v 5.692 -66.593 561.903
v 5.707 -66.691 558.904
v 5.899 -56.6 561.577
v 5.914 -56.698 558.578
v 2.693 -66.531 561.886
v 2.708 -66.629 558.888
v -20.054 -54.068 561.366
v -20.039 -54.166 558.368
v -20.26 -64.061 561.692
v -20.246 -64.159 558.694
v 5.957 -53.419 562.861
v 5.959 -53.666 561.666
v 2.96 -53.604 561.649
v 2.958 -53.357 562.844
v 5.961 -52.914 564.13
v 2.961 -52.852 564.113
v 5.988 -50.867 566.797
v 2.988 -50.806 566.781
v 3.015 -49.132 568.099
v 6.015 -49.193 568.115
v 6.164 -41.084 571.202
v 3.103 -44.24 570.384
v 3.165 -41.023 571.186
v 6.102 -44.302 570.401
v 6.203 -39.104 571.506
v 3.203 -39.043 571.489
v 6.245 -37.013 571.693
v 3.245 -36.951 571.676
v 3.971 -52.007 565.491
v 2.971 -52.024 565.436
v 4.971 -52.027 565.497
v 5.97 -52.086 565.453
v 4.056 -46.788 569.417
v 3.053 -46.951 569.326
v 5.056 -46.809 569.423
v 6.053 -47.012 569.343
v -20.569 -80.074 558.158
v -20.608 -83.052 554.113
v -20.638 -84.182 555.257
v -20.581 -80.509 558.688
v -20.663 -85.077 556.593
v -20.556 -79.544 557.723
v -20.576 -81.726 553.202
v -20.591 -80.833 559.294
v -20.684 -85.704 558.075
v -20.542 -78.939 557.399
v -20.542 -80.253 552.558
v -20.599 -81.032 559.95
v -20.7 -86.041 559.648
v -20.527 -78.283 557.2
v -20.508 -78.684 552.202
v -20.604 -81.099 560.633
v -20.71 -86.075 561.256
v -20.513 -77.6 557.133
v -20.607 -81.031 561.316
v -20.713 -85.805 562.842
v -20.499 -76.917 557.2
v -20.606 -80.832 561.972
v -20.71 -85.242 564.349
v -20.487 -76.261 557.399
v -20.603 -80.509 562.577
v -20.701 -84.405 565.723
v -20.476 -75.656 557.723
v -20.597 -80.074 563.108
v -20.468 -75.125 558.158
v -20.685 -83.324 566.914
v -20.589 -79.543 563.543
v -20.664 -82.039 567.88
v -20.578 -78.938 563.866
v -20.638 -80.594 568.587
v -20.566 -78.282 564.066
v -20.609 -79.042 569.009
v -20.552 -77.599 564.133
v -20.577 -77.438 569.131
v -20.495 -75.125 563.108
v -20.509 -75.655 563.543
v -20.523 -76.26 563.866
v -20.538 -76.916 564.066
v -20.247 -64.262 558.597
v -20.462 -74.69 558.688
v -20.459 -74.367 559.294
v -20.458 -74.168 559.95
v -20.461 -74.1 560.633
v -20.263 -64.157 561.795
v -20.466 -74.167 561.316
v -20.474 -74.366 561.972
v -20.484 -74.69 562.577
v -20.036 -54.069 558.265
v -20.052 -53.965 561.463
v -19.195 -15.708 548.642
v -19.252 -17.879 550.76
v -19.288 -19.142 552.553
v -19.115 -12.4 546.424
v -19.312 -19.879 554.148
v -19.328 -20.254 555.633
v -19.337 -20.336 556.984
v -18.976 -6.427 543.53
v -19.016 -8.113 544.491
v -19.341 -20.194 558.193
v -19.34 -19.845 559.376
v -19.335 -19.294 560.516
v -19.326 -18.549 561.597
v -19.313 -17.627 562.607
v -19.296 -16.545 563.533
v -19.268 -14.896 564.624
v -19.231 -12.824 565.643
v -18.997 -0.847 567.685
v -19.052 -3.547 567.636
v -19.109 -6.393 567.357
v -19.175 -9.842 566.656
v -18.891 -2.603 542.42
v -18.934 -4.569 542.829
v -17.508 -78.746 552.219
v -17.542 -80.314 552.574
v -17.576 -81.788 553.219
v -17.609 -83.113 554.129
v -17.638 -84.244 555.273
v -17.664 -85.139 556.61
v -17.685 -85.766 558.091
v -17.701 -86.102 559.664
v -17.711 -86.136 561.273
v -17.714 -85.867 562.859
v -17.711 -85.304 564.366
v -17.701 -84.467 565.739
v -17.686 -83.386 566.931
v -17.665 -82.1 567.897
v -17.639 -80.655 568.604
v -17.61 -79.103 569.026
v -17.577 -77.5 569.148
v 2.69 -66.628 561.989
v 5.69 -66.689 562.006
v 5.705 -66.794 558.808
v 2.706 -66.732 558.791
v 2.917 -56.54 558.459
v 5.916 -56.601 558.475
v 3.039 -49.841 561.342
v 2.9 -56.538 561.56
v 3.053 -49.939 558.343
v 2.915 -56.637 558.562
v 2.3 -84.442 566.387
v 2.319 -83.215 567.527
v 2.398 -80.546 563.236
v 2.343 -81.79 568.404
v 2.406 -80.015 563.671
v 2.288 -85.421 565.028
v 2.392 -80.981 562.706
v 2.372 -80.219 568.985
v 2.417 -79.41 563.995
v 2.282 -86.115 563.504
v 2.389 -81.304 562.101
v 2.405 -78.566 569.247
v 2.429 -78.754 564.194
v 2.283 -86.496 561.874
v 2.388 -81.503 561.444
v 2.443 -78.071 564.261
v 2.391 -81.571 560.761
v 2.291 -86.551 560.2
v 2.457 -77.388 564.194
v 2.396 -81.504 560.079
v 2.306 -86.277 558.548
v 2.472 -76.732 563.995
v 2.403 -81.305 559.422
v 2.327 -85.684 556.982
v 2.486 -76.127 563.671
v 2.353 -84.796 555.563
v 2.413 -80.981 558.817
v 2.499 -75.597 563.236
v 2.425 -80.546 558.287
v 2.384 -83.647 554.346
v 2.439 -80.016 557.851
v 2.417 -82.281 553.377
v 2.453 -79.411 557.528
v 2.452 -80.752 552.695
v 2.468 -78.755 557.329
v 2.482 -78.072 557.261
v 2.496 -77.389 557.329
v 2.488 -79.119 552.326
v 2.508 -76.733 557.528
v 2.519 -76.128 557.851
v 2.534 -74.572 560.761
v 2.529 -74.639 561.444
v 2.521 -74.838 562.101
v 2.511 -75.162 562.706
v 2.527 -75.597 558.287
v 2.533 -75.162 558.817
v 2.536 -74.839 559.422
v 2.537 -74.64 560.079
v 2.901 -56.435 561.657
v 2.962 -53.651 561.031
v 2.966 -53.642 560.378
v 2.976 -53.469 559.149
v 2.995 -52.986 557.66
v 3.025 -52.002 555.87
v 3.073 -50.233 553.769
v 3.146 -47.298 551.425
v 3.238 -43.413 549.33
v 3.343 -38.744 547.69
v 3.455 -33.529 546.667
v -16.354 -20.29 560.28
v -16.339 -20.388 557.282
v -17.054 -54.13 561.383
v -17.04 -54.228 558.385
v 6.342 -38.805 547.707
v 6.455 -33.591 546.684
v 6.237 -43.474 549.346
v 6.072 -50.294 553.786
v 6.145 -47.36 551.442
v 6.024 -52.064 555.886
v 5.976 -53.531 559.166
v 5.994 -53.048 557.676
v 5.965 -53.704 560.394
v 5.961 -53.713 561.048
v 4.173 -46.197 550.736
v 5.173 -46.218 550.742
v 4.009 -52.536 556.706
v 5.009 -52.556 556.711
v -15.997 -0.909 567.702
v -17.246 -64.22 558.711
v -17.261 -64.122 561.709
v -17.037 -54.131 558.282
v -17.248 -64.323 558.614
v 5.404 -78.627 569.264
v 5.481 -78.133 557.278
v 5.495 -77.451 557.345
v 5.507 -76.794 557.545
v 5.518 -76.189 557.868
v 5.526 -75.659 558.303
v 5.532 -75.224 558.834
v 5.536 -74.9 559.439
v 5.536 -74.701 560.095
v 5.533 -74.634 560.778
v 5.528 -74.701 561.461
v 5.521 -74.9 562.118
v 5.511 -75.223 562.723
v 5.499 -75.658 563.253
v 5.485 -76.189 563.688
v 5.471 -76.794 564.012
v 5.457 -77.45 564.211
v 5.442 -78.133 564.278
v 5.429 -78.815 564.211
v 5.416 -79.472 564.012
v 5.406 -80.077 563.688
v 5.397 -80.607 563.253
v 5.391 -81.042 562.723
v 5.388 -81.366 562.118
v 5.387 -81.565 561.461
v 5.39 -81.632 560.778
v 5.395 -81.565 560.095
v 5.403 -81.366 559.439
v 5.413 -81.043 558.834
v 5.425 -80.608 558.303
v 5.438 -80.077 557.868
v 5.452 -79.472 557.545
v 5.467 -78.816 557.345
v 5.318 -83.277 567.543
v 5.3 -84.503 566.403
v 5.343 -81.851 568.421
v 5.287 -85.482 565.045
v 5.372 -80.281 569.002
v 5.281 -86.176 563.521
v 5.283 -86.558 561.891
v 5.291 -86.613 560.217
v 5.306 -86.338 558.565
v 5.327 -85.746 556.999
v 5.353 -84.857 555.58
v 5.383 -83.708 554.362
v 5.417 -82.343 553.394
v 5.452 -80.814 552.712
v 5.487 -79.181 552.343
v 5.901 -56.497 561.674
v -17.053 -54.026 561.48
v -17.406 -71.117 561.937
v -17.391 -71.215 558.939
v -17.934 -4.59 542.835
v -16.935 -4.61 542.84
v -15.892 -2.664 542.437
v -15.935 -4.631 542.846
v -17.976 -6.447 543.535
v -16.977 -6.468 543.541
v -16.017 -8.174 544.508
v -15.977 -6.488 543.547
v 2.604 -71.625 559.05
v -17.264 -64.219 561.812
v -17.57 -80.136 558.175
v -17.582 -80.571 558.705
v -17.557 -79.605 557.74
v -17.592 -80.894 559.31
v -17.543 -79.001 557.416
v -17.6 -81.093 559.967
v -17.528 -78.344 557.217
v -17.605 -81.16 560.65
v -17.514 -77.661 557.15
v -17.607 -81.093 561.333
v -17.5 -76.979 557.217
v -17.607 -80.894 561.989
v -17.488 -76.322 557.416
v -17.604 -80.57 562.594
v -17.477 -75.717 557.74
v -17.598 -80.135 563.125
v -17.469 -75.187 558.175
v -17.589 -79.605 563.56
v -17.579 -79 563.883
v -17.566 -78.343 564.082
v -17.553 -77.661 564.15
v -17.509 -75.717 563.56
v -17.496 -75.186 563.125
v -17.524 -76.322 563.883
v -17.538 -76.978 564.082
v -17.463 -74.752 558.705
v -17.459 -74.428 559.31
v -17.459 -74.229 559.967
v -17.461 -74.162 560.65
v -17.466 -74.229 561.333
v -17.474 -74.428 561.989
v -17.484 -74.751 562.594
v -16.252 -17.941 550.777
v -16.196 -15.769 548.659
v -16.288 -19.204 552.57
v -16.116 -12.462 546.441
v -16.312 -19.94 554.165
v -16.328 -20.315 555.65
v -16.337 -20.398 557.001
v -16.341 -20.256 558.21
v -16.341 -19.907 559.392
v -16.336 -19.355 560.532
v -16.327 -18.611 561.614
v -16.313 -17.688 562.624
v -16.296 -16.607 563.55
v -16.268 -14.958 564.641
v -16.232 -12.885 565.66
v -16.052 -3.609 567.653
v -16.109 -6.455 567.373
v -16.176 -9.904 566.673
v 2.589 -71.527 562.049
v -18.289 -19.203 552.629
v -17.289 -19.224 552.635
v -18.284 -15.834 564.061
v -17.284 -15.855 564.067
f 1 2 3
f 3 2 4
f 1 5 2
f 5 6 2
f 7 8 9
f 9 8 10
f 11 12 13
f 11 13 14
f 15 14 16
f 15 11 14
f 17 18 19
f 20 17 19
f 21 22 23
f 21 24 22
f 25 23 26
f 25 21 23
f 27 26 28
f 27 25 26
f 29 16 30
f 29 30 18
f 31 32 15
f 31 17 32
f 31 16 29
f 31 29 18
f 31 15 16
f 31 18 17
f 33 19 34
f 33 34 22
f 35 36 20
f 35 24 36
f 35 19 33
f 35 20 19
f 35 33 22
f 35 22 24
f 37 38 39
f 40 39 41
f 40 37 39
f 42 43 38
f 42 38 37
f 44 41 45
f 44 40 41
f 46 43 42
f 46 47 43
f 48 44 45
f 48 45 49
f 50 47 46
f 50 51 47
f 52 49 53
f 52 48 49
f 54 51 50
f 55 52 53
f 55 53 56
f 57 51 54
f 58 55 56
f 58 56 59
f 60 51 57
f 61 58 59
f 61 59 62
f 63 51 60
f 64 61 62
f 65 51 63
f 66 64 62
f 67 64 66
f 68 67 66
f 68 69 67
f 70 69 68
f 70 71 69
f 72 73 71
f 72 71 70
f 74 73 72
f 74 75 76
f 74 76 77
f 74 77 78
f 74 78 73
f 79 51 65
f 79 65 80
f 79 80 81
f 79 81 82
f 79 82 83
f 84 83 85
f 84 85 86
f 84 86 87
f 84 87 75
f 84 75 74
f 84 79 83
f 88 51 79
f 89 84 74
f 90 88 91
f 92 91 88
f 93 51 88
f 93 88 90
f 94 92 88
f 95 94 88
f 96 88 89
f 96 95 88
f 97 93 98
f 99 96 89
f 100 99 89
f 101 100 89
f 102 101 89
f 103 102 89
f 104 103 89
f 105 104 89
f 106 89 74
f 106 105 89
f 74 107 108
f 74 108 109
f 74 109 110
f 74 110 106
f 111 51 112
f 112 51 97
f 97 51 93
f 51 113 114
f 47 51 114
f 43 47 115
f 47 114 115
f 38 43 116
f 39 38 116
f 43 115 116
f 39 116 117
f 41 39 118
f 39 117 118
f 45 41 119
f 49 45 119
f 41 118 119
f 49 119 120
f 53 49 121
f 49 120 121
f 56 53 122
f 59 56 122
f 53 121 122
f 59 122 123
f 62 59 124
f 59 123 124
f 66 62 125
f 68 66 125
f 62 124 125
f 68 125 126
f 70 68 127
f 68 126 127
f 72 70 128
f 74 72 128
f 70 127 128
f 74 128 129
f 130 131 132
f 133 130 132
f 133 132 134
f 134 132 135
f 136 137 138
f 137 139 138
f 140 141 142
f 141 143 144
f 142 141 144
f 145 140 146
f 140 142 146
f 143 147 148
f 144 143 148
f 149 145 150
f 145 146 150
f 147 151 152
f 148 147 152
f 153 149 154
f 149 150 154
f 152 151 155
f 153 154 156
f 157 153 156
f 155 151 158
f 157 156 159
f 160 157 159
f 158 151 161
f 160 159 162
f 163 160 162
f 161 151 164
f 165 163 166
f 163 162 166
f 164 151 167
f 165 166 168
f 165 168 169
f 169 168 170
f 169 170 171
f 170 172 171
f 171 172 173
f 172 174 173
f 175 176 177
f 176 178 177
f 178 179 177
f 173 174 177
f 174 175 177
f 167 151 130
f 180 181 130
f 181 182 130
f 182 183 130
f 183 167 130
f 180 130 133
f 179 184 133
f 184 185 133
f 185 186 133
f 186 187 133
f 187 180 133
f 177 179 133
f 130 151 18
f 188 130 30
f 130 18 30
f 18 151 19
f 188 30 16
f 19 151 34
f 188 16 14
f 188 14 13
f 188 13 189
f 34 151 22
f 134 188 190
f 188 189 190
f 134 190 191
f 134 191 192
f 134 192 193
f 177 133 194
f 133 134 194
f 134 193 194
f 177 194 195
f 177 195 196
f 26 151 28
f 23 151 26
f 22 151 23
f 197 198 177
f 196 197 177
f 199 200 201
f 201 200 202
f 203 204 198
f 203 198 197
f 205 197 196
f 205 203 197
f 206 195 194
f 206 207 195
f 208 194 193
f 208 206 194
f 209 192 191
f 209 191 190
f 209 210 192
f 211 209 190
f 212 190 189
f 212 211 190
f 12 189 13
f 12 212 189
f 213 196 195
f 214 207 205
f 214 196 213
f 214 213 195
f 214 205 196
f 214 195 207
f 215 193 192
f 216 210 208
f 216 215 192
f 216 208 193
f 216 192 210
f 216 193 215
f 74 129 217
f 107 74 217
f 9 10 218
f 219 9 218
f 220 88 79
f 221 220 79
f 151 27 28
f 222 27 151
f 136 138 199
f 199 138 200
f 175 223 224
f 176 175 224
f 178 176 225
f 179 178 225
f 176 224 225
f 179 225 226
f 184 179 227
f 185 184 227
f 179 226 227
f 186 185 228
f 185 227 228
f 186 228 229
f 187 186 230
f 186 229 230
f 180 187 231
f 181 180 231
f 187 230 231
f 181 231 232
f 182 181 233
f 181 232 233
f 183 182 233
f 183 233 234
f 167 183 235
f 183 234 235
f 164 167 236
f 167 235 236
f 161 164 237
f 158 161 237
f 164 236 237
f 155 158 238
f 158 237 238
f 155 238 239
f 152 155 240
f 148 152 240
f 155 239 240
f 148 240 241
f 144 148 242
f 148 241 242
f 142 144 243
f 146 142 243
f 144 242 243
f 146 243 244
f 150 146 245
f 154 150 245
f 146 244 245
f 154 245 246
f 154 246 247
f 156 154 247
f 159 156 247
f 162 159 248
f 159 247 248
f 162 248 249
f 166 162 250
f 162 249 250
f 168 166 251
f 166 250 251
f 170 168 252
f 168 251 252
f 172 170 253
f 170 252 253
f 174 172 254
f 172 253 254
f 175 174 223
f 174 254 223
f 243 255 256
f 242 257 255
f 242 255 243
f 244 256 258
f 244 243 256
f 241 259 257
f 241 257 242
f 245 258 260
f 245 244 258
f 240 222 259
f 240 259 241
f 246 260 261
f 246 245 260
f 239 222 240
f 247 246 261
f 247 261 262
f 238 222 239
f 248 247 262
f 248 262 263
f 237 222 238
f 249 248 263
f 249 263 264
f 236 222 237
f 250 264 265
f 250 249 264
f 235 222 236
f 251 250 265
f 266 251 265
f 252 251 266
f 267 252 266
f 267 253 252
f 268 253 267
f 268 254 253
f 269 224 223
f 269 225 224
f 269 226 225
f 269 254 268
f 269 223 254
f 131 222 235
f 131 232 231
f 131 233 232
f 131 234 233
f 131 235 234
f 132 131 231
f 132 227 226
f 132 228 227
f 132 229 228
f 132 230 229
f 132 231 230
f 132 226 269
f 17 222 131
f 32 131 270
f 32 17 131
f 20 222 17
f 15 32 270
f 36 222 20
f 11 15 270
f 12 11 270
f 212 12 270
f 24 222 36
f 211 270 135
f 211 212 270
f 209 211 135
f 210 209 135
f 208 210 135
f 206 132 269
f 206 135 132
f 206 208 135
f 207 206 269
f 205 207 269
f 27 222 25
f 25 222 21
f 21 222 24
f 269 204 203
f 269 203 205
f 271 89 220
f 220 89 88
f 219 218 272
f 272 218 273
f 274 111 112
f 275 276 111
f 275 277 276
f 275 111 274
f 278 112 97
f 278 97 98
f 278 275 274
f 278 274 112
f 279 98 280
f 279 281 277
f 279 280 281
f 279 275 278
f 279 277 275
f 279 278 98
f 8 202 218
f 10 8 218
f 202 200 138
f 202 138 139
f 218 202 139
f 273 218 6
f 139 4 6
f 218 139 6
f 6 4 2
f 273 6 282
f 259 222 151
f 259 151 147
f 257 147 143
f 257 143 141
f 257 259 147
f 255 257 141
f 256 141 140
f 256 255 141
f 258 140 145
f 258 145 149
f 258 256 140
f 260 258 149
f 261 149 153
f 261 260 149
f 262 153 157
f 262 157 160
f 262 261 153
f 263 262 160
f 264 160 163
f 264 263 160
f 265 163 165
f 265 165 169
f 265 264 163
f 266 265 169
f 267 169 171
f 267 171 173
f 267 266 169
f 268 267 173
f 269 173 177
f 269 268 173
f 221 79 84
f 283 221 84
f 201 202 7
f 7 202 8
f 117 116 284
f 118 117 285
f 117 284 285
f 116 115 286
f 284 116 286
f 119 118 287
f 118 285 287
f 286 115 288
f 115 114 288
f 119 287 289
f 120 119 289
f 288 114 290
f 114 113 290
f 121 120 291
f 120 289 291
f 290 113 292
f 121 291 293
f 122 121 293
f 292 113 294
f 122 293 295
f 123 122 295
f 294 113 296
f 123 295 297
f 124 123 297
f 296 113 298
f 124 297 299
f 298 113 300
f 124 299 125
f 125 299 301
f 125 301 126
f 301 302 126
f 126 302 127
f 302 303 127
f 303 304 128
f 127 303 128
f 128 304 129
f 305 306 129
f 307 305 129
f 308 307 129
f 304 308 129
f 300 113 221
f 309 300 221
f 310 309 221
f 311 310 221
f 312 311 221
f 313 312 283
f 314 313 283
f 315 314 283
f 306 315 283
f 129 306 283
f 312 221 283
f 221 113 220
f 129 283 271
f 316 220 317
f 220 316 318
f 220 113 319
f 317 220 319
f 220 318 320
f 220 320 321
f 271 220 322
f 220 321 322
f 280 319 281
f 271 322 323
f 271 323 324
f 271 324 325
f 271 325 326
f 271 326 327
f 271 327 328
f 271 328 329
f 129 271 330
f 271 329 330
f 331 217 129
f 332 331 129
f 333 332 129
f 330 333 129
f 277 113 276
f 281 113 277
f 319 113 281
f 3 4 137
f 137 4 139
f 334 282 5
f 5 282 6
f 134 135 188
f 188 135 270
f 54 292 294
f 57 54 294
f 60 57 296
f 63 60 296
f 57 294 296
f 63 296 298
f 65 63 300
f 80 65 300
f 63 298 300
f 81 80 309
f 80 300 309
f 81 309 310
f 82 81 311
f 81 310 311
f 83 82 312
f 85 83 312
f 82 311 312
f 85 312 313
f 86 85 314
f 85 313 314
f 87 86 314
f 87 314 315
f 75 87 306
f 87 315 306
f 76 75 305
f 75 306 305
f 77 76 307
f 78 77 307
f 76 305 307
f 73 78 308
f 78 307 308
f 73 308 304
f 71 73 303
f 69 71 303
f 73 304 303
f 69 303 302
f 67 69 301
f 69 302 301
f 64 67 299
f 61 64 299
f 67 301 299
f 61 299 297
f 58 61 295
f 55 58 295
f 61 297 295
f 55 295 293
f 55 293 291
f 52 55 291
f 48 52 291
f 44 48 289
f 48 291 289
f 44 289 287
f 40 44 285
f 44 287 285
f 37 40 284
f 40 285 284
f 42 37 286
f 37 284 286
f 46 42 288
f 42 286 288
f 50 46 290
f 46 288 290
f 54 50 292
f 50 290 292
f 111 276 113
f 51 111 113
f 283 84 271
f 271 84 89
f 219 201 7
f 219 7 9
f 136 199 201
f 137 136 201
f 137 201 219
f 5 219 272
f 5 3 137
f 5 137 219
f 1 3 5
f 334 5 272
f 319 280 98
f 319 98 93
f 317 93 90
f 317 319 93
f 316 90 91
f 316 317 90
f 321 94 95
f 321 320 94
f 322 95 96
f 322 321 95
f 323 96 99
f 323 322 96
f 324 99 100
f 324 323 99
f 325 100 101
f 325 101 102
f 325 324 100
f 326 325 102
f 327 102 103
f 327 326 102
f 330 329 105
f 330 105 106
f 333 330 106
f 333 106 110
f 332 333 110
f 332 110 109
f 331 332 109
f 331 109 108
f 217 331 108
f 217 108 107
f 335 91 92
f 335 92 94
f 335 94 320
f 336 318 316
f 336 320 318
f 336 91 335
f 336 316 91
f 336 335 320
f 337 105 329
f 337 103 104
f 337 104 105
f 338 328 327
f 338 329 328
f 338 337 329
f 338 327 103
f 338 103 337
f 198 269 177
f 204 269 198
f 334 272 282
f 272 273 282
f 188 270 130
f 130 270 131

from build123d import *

# Parameters (mm, degrees)
SZKIC1_R                    = 3.5
DODANIE_WYCI_GNI_CIE1_DEPTH = 3
SZKIC3_R                    = 3.5
DODANIE_WYCI_GNI_CIE2_DEPTH = 3
DODANIE_WYCI_GNI_CIE3_DEPTH = 1.5
WYTNIJ_WYCI_GNI_CIE2_DEPTH  = 28.857347736
WYTNIJ_WYCI_GNI_CIE3_DEPTH  = 3


with BuildPart() as part:
    # Szkic1 → Dodanie-wyciągnięcie1 (new body)
    with BuildSketch(Plane(origin=(10.192666609, -0.209197232, 0.056926585), x_dir=(0.005582614, -0.000114579, -0.999984411), z_dir=(0.999773857, -0.020519647, 0.00558379))):
        with BuildLine():
            Line((-571.644797139, -36.876698077), (-569.215505996, -78.499745052))
            ThreePointArc((-569.215505996, -78.499745052), (-561.006887899, -86.499980329), (-552.29465683, -79.05134251))
            Line((-552.29465683, -79.05134251), (-546.635500505, -33.451067502))
            add(Edge.make_bspline(
                [(-546.635500505, -33.451067502), (-548.420830275, -47.836874114), (-555.450846412, -54.267572979), (-561.617780939, -53.532316767)],
                knots=[0.751052597, 0.751052597, 0.751052597, 0.751052597, 1, 1, 1, 1], degree=3, weights=[0.500008864, 0.501406417, 0.66807013, 1]))
            add(Edge.make_bspline(
                [(-561.617780939, -53.532316767), (-566.500920992, -52.950121667), (-571.015461445, -47.659625114), (-571.644797139, -36.876698077)],
                knots=[0, 0, 0, 0, 0.211755159, 0.211755159, 0.211755159, 0.211755159], degree=3, weights=[1, 0.717659787, 0.554893568, 0.511701343]))
        make_face()
        with Locations((-560.729946174, -78.004493099)):
            Circle(SZKIC1_R, mode=Mode.SUBTRACT)
    extrude(amount=-DODANIE_WYCI_GNI_CIE1_DEPTH)

    # Szkic8 → Wytnij-wyciągnięcie2 (cut, through all)
    with BuildSketch(Plane(origin=(10.192666609, -0.209197232, 0.056926585), x_dir=(0.005582614, -0.000114579, -0.999984411), z_dir=(0.999773857, -0.020519647, 0.00558379))):
        Polygon((-561.625338915, -56.363830635), (-561.957668986, -66.558415311), (-558.759367911, -66.662675725), (-558.42703784, -56.468091049), align=None)
    extrude(amount=-WYTNIJ_WYCI_GNI_CIE2_DEPTH, mode=Mode.SUBTRACT)


with BuildPart() as body_2:
    # Szkic3 → Dodanie-wyciągnięcie2 (new body)
    with BuildSketch(Plane(origin=(-12.802132105, 0.262754656, -0.071500588), x_dir=(0.005582614, -0.000114579, -0.999984411), z_dir=(0.999773857, -0.020519647, 0.00558379))):
        with BuildLine():
            Line((-569.228431577, -77.844037968), (-567.782050057, -1.236626489))
            add(Edge.make_bspline(
                [(-544.588187851, -8.501410275), (-553.261802258, -32.499980703), (-568.293763066, -28.339440284), (-567.782050057, -1.236626489)],
                knots=[0, 0, 0, 0, 0.978692843, 0.978692843, 0.978692843, 0.978692843], degree=3, weights=[1, 0.514675302, 0.504334413, 0.968977332]))
            add(Edge.make_bspline(
                [(-542.517178695, -2.989655167), (-542.77659051, -5.007707817), (-543.482930745, -6.876853891), (-544.588187851, -8.501410275)],
                knots=[0.307426475, 0.307426475, 0.307426475, 0.307426475, 1, 1, 1, 1], degree=3, weights=[0.976443899, 0.96660679, 0.974458824, 1]))
            Line((-542.517178695, -2.989655167), (-552.299314559, -79.088213807))
            ThreePointArc((-552.299314559, -79.088213807), (-561.352958544, -86.481630327), (-569.228431577, -77.844037968))
        make_face()
        with Locations((-560.729946174, -78.004493098)):
            Circle(SZKIC3_R, mode=Mode.SUBTRACT)
    extrude(amount=-DODANIE_WYCI_GNI_CIE2_DEPTH)

    # Szkic9 → Wytnij-wyciągnięcie3 (cut)
    with BuildSketch(Plane(origin=(-15.801453676, 0.324313598, -0.088251958), x_dir=(-0.005582614, 0.000114579, 0.999984411), z_dir=(-0.999773857, 0.020519647, -0.00558379))):
        Polygon((561.560176157, -54.364892463), (558.361875082, -54.469152877), (558.694205152, -64.663737554), (561.892506227, -64.559477139), align=None)
    extrude(amount=-WYTNIJ_WYCI_GNI_CIE3_DEPTH, mode=Mode.SUBTRACT)


with BuildPart() as body_3:
    # Szkic5 → Dodanie-wyciągnięcie3 (new body, symmetric)
    with BuildSketch(Plane(origin=(-2.739847058, 18.236911776, 557.585868102), x_dir=(0.020690962, 0.999254908, -0.032580872), z_dir=(0.004911082, -0.032689038, -0.999453505))):
        Polygon((-82.732434552, -15.805027871), (-82.732434552, -12.805027871), (-89.732434552, -12.805027871), (-89.732434552, 7.194972129), (-84.732434552, 7.194972129), (-84.732434552, 10.194972129), (-74.732434552, 10.194972129), (-74.732434552, 7.194972129), (-68.029811107, 7.194972129), (-38.868028096, -12.805027871), (-72.732434552, -12.805027871), (-72.732434552, -15.805027871), align=None)
    extrude(amount=DODANIE_WYCI_GNI_CIE3_DEPTH, both=True)


solid = Compound([part.part, body_2.part, body_3.part])
